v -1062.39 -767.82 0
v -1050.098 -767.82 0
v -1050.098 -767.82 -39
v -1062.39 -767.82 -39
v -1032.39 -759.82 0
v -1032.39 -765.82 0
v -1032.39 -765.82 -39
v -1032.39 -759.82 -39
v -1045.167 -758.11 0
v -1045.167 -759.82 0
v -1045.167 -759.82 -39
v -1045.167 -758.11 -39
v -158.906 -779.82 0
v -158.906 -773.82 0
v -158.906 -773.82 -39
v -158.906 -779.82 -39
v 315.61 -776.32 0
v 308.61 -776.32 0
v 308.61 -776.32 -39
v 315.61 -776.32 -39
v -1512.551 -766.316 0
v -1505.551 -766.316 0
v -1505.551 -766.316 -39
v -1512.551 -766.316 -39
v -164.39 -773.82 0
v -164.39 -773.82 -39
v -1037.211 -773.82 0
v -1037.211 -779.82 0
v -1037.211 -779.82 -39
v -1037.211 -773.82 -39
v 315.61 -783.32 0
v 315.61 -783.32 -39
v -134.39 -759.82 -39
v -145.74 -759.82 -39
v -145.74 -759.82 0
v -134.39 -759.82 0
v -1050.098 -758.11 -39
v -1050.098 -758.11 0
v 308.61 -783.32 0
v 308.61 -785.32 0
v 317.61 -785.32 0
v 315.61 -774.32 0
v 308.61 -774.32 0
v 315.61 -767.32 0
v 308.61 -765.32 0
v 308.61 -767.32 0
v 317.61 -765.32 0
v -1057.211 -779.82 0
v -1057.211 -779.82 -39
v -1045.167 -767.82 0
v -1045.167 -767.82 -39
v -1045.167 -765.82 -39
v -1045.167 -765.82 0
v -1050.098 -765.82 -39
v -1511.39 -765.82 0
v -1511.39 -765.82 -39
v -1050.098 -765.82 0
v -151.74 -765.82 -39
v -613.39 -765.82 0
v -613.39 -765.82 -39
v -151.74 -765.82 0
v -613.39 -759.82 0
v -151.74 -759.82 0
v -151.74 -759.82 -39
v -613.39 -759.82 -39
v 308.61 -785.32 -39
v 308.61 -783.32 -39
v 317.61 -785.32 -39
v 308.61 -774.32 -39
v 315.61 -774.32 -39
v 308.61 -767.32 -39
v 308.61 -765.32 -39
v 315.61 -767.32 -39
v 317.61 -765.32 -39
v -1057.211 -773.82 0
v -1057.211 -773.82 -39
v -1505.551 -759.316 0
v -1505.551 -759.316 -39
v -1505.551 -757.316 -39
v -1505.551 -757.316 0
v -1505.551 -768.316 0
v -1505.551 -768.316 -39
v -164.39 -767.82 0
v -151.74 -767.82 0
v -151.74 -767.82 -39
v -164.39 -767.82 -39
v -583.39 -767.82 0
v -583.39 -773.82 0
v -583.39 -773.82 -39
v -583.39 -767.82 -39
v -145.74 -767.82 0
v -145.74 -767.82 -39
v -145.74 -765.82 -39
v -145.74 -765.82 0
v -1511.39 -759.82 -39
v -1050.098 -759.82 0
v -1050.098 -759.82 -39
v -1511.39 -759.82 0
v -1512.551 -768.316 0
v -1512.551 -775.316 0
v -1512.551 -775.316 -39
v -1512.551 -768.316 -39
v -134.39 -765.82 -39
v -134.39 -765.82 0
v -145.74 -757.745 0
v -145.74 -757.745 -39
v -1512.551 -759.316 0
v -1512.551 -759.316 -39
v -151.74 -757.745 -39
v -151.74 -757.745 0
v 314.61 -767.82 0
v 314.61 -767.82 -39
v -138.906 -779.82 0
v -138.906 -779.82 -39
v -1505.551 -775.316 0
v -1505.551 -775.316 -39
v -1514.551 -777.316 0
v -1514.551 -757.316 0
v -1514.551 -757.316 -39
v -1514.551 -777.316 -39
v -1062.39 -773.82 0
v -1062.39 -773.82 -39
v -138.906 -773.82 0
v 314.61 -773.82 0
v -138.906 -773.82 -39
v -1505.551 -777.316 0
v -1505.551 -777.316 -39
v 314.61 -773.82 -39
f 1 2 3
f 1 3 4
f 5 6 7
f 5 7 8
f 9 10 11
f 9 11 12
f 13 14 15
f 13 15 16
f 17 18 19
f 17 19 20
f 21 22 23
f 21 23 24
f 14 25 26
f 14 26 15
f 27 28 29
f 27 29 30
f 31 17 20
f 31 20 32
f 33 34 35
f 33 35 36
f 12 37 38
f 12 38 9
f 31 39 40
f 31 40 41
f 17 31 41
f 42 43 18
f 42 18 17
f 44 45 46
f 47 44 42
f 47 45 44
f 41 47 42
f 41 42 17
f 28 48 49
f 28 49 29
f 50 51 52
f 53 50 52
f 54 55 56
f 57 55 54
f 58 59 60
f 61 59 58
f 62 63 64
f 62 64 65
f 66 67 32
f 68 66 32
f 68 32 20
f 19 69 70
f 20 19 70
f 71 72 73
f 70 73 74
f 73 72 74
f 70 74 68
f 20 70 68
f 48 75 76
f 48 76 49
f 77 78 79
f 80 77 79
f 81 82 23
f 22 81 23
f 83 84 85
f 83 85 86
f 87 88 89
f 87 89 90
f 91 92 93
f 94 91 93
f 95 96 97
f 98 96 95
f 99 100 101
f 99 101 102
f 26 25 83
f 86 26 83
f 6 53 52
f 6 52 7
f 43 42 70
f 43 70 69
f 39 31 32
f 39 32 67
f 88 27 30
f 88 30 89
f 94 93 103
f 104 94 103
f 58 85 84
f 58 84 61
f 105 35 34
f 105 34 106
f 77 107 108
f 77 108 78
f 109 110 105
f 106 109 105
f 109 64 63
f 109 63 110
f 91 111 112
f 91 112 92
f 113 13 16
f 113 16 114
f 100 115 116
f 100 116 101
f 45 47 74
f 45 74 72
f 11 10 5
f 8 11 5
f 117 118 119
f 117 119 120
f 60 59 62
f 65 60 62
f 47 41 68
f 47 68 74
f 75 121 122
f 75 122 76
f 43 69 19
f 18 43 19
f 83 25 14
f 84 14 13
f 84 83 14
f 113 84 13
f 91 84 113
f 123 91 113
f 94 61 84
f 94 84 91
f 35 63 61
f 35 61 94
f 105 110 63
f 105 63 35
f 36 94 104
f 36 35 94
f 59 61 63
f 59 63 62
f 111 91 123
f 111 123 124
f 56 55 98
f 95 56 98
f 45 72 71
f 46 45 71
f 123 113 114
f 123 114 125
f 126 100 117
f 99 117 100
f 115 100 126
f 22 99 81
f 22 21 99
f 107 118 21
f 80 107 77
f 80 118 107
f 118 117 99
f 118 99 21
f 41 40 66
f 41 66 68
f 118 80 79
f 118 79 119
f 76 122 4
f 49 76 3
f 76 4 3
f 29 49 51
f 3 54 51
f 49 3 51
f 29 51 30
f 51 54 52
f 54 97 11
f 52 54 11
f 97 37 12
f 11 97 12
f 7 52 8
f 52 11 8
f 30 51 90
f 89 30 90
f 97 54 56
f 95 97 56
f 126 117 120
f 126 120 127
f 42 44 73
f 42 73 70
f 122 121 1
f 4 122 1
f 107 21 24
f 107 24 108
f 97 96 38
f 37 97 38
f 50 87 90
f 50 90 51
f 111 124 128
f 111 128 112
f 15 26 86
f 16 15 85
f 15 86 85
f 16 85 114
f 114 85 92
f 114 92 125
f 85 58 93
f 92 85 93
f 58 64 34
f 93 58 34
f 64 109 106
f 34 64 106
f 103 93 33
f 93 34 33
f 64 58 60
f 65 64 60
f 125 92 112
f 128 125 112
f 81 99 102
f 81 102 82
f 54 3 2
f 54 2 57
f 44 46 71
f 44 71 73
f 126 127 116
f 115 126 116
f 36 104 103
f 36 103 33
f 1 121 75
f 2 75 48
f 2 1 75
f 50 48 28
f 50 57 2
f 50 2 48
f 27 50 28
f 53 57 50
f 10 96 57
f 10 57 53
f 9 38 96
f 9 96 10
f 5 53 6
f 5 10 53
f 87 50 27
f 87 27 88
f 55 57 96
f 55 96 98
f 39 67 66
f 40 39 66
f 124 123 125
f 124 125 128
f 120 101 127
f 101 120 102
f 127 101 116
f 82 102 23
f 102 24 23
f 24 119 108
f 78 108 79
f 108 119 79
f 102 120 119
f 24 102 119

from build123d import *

# Parameters (mm, degrees)
F0_W     = 20
F0_H     = 6
F0_W_2   = 5.1789569855
F0_W_3   = 461.2922945023
F0_W_4   = 4.9307346344
F0_H_2   = 3.1461458206
F0_H_3   = 2
F0_H_4   = 1.7102184296
F0_W_5   = 12.7769708633
F0_W_6   = 453.8210430145
F1_DEPTH = 39
F0_W_7   = 461.6499215364
F0_W_8   = 6
F0_H_5   = 2.9253702164
F0_H_6   = 2.0746297836
F0_W_9   = 11.3500784636
F0_W_10  = 5.483762145
F0_W_11  = 453.516237855


with BuildPart() as f1:
    # F0 (on Top) → F1 (new body)
    with BuildSketch(Plane.XY):
        with Locations((-1047.2112798691, -776.8197283745)):
            Rectangle(F0_W, F0_H)
        Polygon((-1050.0979423523, -770.9658741951), (-1050.0979423523, -767.8197283745), (-1057.2112798691, -767.8197283745), (-1057.2112798691, -773.8197283745), (-1037.2112798691, -773.8197283745), (-1037.2112798691, -767.8197283745), (-1045.1672077179, -767.8197283745), (-1045.1672077179, -770.9658741951), align=None)
        with Locations((-1059.8007583618, -770.8197283745)):
            Rectangle(F0_W_2, F0_H)
        with Locations((-1280.7440896034, -762.8197283745)):
            Rectangle(F0_W_3, F0_H)
        with Locations((-1047.6325750351, -762.8197283745)):
            Rectangle(F0_W_4, F0_H)
        with Locations((-1047.6325750351, -769.3928012848)):
            Rectangle(F0_W_4, F0_H_2)
        with Locations((-1047.6325750351, -766.8197283745)):
            Rectangle(F0_W_4, F0_H_3)
        with Locations((-1047.6325750351, -758.9646191597)):
            Rectangle(F0_W_4, F0_H_4)
        with Locations((-1038.7787222862, -762.8197283745)):
            Rectangle(F0_W_5, F0_H)
        with Locations((-810.3007583618, -770.8197283745)):
            Rectangle(F0_W_6, F0_H)
    extrude(amount=-F1_DEPTH)


with BuildPart() as f1b:
    # F0 (on Top) → F1, piece 2 (new body)
    with BuildSketch(Plane.XY):
        Polygon((-1512.5509243011, -759.315735817), (-1505.5509243011, -759.315735817), (-1505.5509243011, -757.315735817), (-1514.5509243011, -757.315735817), (-1514.5509243011, -777.315735817), (-1505.5509243011, -777.315735817), (-1505.5509243011, -775.315735817), (-1512.5509243011, -775.315735817), (-1512.5509243011, -768.315735817), (-1505.5509243011, -768.315735817), (-1505.5509243011, -766.315735817), (-1512.5509243011, -766.315735817), align=None)
    extrude(amount=-F1_DEPTH)


with BuildPart() as f1c:
    # F0 (on Top) → F1, piece 3 (new body)
    with BuildSketch(Plane.XY):
        with Locations((-382.5652760863, -762.8197283745)):
            Rectangle(F0_W_7, F0_H)
        with Locations((-148.9064747095, -776.8197283745)):
            Rectangle(F0_W, F0_H)
        Polygon((-151.7403153181, -770.7450985909), (-151.7403153181, -767.8197283745), (-158.9064747095, -767.8197283745), (-158.9064747095, -773.8197283745), (-138.9064747095, -773.8197283745), (-138.9064747095, -767.8197283745), (-145.7403153181, -767.8197283745), (-145.7403153181, -770.7450985909), align=None)
        with Locations((-148.7403153181, -769.2824134827)):
            Rectangle(F0_W_8, F0_H_5)
        with Locations((-148.7403153181, -766.8197283745)):
            Rectangle(F0_W_8, F0_H_3)
        with Locations((-148.7403153181, -762.8197283745)):
            Rectangle(F0_W_8, F0_H)
        with Locations((-148.7403153181, -758.7824134827)):
            Rectangle(F0_W_8, F0_H_6)
        with Locations((-140.0652760863, -762.8197283745)):
            Rectangle(F0_W_9, F0_H)
        with Locations((-161.648355782, -770.8197283745)):
            Rectangle(F0_W_10, F0_H)
        with Locations((87.851644218, -770.8197283745)):
            Rectangle(F0_W_11, F0_H)
    extrude(amount=-F1_DEPTH)


with BuildPart() as f1d:
    # F0 (on Top) → F1, piece 4 (new body)
    with BuildSketch(Plane.XY):
        Polygon((315.6097631454, -783.3197283745), (308.6097631454, -783.3197283745), (308.6097631454, -785.3197283745), (317.6097631454, -785.3197283745), (317.6097631454, -765.3197283745), (308.6097631454, -765.3197283745), (308.6097631454, -767.3197283745), (315.6097631454, -767.3197283745), (315.6097631454, -774.3197283745), (308.6097631454, -774.3197283745), (308.6097631454, -776.3197283745), (315.6097631454, -776.3197283745), align=None)
    extrude(amount=-F1_DEPTH)


solid = Compound([f1.part, f1b.part, f1c.part, f1d.part])
